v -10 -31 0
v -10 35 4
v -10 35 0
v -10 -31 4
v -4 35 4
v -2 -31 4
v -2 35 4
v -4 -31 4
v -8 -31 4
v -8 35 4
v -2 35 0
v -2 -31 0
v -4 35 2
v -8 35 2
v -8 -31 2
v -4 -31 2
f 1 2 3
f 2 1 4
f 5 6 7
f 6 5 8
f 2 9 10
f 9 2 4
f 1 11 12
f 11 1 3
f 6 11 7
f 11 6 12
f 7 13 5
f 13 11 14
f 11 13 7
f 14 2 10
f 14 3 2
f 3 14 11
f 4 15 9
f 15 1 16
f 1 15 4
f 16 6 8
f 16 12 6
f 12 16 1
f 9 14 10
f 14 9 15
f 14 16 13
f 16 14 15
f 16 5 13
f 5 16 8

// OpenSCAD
$fn=250;

mirror(v= [1,0,0] ) {
	union(){
		difference(){
			translate([2,-31,0]) cube([8,62+4,4]);
			translate([4,-31.5,2]) cube([4,62+6,3]);
		}
	}
}
